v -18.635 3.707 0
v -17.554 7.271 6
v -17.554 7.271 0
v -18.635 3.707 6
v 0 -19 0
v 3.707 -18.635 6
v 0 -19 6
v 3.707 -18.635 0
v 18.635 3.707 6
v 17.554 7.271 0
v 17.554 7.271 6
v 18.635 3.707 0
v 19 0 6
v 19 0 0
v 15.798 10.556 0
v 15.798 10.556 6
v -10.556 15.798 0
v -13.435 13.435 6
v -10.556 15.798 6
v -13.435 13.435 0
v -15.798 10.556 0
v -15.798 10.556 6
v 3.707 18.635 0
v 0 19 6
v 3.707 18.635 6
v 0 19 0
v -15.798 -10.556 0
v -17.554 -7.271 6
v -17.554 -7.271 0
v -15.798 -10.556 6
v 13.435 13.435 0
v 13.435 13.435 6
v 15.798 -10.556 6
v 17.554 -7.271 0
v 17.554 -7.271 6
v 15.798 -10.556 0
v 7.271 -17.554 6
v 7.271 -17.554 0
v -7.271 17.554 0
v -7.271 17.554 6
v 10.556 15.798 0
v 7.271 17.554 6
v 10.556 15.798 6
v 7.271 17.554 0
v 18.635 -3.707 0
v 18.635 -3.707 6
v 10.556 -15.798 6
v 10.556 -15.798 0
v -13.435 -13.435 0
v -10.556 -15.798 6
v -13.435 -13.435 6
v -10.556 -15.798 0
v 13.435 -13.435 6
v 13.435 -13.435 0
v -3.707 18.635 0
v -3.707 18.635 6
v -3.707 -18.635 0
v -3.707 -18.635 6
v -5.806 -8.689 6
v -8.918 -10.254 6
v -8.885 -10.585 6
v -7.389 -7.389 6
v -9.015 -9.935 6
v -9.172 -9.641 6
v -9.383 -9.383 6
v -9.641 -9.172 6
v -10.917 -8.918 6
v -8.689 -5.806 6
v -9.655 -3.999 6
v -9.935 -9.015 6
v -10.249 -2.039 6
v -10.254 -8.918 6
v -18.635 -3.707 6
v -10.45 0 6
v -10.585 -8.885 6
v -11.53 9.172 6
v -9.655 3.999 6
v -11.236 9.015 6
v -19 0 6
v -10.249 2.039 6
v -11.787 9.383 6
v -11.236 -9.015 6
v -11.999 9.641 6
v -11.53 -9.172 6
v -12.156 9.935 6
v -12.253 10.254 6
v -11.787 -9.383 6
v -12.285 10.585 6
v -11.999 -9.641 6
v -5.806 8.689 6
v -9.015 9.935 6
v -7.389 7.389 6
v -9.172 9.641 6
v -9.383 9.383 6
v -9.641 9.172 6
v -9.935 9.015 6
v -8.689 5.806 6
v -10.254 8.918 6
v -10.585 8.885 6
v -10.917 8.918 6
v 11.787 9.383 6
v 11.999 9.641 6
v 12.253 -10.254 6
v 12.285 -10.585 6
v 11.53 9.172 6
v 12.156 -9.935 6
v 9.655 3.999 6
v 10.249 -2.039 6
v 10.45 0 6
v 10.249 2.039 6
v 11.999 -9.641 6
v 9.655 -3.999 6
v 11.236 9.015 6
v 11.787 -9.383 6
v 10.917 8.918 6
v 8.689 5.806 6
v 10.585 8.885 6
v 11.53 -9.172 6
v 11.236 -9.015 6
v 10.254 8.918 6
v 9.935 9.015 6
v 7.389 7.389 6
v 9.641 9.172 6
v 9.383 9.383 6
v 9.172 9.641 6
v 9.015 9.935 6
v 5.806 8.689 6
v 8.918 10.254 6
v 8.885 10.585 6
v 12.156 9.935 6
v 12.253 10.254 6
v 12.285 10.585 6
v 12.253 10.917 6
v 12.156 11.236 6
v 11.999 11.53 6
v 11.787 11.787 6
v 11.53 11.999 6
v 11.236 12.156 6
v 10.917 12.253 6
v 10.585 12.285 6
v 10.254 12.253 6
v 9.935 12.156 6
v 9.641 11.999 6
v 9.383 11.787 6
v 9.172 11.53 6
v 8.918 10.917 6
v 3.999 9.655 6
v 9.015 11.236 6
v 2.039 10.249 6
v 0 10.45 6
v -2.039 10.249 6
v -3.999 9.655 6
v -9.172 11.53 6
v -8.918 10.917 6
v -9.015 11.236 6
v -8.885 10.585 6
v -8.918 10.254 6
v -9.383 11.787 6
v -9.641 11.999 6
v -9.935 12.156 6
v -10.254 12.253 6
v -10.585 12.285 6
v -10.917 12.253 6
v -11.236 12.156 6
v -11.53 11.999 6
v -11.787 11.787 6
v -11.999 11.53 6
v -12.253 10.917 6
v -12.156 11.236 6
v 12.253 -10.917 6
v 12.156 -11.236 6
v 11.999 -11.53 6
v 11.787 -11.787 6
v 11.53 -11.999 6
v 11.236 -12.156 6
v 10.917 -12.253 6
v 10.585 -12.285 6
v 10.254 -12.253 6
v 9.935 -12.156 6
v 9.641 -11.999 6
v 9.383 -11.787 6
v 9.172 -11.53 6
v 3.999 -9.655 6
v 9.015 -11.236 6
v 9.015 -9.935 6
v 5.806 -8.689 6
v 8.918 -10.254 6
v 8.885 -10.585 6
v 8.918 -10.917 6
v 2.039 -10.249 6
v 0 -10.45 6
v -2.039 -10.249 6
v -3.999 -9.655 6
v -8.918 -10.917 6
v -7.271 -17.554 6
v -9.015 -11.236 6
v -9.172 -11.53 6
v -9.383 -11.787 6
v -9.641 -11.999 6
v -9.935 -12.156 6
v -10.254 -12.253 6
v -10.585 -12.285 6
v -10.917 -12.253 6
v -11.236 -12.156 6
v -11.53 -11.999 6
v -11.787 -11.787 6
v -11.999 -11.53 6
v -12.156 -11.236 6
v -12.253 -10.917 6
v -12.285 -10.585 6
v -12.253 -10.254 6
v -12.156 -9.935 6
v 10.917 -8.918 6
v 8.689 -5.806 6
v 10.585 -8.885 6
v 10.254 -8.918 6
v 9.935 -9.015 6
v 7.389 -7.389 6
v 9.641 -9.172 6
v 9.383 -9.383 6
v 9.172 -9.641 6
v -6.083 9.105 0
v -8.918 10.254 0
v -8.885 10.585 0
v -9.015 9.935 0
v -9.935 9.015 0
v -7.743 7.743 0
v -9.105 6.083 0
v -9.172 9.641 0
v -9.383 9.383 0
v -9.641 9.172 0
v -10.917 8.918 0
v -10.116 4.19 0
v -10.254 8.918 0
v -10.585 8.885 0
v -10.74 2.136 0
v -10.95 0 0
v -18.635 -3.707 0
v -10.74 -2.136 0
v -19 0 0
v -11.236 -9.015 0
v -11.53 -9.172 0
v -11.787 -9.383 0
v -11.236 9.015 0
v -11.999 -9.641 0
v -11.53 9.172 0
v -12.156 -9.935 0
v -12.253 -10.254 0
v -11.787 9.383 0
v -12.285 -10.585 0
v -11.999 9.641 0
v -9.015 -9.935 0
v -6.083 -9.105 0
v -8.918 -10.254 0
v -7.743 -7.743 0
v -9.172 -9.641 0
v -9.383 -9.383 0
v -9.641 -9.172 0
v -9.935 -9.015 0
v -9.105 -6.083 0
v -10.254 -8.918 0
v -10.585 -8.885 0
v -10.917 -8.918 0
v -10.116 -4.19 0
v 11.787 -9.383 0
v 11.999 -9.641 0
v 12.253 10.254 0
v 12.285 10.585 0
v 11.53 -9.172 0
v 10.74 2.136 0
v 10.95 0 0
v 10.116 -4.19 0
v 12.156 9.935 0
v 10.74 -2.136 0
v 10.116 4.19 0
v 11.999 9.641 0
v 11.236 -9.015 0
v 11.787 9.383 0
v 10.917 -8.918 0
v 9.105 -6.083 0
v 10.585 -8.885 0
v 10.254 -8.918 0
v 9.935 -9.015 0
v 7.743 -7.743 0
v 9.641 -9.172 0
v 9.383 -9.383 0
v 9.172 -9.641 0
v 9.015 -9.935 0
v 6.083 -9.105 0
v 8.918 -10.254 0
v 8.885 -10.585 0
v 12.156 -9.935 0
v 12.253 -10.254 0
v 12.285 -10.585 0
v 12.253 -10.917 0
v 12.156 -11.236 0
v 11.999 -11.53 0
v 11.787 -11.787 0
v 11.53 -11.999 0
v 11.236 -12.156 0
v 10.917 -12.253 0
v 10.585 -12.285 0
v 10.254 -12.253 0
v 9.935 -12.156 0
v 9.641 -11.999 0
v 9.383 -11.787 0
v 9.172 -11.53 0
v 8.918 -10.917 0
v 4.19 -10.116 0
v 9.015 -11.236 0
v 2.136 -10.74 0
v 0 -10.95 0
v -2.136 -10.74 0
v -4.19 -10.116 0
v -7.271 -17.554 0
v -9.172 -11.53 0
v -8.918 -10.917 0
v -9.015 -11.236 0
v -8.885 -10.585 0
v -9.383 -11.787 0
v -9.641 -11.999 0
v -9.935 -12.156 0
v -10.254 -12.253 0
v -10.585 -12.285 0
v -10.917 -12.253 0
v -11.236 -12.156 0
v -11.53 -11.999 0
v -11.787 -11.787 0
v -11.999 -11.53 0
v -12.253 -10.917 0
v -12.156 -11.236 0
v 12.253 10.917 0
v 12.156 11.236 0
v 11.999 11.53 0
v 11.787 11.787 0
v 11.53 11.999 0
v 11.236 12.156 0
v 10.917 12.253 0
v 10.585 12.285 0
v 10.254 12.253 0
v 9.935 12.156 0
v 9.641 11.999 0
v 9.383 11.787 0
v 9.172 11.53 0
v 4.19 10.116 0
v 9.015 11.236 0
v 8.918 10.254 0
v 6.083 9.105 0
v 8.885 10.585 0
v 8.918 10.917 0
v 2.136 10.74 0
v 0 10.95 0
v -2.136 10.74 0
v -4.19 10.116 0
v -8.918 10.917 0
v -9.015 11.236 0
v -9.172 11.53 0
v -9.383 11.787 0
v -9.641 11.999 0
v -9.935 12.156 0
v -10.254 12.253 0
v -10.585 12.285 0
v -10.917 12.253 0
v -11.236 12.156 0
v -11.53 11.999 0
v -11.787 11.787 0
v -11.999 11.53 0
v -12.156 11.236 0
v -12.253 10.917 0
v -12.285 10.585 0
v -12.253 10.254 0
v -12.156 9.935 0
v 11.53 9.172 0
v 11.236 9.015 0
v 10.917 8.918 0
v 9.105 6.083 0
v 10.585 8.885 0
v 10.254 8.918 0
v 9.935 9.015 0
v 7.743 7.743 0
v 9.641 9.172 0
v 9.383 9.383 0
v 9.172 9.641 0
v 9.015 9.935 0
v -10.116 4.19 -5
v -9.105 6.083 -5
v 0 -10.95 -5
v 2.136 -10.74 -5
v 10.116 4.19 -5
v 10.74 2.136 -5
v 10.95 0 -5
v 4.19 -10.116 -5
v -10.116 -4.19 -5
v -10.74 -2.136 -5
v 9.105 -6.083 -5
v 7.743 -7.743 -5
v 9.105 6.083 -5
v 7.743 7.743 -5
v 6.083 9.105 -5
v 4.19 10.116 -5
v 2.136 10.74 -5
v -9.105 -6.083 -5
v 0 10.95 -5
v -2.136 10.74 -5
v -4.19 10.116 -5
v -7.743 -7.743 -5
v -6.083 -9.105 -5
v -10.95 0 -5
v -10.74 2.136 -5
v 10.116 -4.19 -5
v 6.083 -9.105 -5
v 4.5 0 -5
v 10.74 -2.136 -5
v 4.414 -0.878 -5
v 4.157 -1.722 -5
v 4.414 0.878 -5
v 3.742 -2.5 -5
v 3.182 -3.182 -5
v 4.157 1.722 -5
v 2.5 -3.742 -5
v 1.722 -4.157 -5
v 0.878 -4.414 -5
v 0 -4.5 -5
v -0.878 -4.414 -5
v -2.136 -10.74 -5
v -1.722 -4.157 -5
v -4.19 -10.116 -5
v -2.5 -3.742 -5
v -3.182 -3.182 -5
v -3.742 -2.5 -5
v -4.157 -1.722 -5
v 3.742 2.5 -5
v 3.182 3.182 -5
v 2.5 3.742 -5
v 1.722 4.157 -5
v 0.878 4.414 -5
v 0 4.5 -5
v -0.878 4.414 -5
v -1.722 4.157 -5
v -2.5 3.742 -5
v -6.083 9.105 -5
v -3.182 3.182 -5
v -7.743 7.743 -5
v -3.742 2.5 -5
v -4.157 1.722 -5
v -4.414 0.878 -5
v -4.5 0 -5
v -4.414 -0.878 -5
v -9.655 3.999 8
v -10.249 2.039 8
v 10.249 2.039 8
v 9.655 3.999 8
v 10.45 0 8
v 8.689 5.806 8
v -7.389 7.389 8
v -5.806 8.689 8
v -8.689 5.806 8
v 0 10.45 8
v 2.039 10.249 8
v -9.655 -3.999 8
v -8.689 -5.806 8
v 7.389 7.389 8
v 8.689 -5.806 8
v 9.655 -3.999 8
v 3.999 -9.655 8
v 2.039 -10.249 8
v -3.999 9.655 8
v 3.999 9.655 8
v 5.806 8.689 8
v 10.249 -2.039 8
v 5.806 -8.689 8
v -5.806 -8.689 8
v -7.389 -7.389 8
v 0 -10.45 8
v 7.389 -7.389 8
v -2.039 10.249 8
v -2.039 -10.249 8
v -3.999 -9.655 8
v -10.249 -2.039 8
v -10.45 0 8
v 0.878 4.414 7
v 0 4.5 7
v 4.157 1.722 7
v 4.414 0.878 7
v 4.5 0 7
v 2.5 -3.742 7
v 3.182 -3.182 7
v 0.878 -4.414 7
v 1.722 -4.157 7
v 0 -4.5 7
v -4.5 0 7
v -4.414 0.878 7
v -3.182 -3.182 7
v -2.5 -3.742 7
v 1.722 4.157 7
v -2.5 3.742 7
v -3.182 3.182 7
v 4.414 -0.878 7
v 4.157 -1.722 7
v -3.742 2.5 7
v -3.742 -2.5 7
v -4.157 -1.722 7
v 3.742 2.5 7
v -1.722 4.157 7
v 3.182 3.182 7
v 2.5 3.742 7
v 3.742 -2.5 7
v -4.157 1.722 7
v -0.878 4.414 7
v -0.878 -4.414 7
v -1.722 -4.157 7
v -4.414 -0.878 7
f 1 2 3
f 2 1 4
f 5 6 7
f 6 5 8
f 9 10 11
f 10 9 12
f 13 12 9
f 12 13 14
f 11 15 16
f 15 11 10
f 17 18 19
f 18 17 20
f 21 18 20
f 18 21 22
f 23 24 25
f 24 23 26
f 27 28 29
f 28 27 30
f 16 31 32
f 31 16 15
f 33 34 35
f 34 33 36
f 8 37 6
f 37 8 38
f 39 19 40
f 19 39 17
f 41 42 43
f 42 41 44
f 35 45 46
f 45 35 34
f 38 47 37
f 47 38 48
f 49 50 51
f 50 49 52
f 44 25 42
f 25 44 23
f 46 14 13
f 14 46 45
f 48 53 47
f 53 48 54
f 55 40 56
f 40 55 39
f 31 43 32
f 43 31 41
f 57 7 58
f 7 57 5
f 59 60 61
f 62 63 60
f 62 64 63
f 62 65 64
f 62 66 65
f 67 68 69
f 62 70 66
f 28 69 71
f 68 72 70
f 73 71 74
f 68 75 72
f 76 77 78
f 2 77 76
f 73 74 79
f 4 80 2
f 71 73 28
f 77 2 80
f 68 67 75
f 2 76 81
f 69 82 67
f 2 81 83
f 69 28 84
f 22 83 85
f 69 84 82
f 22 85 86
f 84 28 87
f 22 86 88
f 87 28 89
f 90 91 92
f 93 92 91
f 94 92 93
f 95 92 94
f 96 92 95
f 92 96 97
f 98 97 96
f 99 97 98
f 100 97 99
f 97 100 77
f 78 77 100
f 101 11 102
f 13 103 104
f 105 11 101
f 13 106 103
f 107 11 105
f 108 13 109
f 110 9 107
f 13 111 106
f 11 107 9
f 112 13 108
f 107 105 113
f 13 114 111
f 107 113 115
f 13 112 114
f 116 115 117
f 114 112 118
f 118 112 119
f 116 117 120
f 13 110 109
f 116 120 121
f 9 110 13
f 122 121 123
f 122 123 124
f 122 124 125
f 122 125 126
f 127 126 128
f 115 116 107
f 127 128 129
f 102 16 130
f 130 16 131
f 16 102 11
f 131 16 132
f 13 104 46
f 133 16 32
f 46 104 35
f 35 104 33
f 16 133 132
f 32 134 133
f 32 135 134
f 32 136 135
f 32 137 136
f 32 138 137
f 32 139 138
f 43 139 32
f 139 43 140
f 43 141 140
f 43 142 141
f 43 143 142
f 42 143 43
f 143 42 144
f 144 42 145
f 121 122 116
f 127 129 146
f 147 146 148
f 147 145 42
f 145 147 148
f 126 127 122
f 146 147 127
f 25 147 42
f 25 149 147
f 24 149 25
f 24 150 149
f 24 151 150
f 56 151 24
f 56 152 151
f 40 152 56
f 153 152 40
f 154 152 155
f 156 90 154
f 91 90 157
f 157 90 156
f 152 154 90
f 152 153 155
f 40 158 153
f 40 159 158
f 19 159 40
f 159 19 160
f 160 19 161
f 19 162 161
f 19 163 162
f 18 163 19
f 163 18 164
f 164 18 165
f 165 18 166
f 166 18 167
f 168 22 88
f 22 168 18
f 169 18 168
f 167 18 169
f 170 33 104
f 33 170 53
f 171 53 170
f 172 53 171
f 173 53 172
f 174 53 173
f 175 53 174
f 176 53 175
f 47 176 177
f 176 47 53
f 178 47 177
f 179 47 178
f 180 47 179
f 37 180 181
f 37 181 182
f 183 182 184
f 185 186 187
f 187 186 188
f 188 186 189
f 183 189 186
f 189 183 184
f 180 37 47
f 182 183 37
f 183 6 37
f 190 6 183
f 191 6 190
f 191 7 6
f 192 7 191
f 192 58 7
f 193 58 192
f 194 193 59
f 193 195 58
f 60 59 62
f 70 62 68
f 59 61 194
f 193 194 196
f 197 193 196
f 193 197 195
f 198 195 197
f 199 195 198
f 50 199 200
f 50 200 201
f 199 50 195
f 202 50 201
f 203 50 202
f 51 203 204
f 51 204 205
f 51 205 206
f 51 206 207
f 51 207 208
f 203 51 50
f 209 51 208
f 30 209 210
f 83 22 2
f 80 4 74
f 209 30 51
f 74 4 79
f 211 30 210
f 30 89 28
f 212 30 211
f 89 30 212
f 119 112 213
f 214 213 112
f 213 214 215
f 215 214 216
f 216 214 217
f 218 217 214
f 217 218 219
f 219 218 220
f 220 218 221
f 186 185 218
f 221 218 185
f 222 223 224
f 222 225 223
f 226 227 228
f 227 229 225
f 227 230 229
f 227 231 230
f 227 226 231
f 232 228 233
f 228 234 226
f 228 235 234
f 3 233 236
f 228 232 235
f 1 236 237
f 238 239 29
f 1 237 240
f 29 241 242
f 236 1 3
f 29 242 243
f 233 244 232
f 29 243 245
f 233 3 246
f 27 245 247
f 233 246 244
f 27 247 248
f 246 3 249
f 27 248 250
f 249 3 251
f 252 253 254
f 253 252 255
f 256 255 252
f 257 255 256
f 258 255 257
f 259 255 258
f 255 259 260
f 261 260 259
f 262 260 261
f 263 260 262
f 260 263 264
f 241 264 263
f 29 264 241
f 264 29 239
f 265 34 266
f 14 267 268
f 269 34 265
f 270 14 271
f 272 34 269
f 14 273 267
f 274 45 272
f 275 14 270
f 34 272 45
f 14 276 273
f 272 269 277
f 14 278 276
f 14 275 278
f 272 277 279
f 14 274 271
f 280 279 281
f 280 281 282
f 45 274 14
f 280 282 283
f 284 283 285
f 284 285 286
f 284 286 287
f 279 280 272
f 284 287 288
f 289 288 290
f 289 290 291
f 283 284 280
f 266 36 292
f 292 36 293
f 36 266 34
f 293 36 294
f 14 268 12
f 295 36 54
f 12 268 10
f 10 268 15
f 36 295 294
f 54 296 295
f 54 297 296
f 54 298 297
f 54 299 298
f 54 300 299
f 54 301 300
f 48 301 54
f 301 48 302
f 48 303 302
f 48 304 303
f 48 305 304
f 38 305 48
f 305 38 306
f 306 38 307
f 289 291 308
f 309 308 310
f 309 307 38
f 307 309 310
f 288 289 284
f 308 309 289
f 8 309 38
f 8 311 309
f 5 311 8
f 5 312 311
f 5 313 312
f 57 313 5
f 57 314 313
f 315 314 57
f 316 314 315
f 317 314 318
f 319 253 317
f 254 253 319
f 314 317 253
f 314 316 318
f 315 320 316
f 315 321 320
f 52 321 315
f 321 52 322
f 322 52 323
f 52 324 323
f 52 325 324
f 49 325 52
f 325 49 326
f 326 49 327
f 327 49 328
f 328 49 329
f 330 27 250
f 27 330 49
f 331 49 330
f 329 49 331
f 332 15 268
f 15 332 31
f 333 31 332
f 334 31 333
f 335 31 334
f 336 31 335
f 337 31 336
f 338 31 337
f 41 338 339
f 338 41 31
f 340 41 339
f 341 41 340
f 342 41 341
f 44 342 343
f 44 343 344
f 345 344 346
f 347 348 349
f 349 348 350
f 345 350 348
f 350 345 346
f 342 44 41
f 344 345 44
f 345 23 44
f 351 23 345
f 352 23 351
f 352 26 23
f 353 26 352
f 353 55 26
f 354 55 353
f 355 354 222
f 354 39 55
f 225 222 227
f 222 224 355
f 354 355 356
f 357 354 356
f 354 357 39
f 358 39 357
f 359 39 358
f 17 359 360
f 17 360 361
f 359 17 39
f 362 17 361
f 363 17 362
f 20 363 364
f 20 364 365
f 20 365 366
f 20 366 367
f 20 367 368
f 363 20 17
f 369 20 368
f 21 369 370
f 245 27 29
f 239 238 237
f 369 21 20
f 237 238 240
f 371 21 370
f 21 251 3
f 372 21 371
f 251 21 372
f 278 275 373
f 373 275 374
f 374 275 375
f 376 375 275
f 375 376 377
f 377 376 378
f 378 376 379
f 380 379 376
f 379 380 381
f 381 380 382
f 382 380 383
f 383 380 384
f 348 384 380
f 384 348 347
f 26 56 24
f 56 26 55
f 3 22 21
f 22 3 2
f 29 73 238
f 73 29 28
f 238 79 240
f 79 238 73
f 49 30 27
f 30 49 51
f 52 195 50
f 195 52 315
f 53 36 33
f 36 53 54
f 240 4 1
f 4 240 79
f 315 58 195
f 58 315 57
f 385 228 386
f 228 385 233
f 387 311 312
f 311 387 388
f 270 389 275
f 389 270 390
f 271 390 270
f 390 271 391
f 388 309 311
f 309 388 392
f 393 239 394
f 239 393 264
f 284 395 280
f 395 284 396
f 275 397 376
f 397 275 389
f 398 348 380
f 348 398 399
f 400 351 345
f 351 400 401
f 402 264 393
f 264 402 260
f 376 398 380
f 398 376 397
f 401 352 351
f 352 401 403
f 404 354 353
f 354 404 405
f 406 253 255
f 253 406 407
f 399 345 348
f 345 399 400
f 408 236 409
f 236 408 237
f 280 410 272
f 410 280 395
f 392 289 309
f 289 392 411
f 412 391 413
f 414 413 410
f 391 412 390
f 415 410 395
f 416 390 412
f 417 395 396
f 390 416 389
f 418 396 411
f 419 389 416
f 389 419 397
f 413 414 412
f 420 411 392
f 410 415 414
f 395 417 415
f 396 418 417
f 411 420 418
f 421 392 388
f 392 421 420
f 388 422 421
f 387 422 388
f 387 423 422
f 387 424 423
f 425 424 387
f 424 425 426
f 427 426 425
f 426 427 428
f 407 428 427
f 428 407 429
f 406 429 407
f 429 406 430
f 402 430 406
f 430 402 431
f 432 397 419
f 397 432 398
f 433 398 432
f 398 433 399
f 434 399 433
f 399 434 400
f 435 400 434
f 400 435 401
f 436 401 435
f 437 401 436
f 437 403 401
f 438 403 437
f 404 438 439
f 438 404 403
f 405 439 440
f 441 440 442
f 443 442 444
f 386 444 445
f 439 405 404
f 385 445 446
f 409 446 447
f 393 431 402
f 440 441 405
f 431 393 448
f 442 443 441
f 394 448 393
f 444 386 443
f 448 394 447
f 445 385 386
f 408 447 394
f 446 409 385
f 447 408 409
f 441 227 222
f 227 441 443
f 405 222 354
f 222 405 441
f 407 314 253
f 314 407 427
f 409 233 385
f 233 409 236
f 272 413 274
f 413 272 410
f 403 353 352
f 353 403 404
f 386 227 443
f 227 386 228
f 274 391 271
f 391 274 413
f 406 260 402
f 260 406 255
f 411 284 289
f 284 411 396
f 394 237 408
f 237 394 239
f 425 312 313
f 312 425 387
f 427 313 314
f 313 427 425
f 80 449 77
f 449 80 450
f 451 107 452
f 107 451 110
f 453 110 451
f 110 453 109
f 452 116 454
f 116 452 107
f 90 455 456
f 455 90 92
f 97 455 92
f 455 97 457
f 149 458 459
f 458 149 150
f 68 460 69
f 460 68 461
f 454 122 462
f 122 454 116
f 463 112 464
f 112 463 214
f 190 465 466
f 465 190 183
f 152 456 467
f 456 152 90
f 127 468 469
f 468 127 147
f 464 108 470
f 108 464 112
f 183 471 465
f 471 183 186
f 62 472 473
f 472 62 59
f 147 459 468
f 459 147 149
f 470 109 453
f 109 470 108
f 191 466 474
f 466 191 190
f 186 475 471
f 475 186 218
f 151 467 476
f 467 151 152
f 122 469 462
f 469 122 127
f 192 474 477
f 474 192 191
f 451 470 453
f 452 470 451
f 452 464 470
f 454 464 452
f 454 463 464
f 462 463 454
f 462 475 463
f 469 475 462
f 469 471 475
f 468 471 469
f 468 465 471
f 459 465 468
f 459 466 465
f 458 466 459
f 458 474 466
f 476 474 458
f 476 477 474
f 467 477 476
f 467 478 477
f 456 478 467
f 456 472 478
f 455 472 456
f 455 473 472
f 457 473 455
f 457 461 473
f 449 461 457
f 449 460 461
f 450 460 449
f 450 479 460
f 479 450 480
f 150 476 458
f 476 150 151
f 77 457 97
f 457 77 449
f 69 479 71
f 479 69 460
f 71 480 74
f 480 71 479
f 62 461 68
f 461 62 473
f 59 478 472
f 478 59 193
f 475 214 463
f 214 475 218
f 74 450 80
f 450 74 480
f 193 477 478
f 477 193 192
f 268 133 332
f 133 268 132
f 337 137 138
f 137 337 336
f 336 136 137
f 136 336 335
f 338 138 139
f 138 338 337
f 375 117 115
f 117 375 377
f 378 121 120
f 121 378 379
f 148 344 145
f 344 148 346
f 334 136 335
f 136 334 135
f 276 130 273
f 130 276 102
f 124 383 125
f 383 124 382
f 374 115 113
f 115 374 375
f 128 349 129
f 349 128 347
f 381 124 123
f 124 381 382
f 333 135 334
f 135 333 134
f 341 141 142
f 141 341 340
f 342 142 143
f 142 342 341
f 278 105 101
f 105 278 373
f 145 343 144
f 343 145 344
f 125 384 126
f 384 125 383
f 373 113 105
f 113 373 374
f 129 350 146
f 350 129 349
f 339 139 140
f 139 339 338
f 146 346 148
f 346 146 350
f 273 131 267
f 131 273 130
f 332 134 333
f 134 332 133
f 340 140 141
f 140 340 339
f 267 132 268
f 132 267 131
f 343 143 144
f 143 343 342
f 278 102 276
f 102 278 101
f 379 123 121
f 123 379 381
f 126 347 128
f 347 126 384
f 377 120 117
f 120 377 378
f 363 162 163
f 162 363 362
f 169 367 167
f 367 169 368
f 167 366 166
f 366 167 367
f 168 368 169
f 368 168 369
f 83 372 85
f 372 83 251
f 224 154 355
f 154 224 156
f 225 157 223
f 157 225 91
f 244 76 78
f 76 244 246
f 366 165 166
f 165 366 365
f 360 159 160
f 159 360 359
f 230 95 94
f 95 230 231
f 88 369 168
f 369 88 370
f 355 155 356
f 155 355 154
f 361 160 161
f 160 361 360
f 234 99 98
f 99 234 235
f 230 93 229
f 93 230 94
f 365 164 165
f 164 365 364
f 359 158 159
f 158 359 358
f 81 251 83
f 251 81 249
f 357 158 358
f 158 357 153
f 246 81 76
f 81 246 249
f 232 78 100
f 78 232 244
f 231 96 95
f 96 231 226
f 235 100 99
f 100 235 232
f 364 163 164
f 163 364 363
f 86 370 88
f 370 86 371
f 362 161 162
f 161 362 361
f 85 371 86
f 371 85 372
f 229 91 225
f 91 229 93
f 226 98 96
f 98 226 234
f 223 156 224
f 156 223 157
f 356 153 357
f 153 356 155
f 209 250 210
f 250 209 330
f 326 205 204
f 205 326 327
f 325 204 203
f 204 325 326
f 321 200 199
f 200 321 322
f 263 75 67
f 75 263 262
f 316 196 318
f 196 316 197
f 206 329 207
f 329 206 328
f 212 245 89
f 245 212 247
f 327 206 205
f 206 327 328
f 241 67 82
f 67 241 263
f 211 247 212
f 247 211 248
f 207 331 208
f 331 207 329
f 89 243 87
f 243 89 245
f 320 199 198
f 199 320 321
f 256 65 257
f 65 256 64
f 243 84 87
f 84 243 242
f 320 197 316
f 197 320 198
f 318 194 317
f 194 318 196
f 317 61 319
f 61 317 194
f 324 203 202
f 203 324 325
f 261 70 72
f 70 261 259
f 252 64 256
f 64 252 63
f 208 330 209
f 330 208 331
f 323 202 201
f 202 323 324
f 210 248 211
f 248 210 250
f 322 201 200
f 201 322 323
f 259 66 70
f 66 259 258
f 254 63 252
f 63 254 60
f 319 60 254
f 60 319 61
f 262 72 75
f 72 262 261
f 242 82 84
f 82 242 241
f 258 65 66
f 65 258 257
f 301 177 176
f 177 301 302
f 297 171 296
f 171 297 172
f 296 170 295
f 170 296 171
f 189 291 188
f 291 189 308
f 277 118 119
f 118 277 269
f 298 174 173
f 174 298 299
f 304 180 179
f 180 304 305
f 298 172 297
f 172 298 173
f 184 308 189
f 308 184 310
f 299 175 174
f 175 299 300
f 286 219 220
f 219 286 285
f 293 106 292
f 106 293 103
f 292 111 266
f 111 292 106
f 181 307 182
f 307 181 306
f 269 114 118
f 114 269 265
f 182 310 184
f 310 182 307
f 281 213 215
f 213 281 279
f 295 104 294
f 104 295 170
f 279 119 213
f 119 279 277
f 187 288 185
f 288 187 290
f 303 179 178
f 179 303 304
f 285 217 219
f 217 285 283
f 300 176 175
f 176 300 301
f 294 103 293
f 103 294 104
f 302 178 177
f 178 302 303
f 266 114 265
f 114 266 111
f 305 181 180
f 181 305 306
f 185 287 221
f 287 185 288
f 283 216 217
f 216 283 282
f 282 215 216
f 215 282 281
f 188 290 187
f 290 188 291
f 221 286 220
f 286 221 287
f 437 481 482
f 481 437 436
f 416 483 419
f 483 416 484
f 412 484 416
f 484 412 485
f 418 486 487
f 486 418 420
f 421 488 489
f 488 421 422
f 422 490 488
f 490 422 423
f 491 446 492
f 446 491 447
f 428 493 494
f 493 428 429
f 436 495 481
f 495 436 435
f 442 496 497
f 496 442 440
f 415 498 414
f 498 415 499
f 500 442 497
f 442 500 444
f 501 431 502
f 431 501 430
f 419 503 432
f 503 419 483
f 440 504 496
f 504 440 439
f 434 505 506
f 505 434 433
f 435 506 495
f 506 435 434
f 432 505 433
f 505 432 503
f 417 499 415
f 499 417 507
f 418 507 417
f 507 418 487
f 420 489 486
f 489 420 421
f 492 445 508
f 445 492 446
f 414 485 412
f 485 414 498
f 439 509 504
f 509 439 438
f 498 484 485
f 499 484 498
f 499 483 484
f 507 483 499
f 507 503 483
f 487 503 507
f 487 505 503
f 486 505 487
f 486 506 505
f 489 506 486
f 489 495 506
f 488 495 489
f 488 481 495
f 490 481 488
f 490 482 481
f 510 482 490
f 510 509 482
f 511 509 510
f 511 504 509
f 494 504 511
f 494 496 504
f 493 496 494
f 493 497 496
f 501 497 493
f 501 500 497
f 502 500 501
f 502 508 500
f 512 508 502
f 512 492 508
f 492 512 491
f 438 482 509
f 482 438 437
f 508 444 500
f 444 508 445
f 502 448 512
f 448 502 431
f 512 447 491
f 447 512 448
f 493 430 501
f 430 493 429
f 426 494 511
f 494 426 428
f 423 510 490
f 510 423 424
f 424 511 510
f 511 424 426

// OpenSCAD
$fn = 32;

// ----------------------------------------------------------------------
// Retaining cap: 608 cover, 38 mm, spigot 21.9 mm
// ----------------------------------------------------------------------

// --- parameters (mm) ---
plate_d = 38;             // cover diameter
plate_t = 6;              // cover thickness
boss_d = 21.9;            // spigot that enters the housing
boss_h = 5;               // spigot height
shaft_d = 9;              // shaft opening
bolt_d = 3.4;             // bolt clearance
bolt_r = 14.97;           // bolt circle radius
dome_h = 2;               // raised centre

module cover() {
  cylinder(h = plate_t, d = plate_d);
}

module spigot() {
  /* sunk 1 mm into the cover; the spigot sets the overall height */
  translate([0, 0, -boss_h]) cylinder(h = boss_h + 1, d = boss_d);
}

module dome() {
  translate([0, 0, plate_t - 1]) cylinder(h = dome_h + 1, d = plate_d * 0.55);
}

difference() {
  union() {
    cover();
    spigot();
    dome();
  }
  for (i = [0 : 3]) rotate([0, 0, 45 + i * 90]) translate([bolt_r, 0, -boss_h - 1])
    cylinder(h = boss_h + plate_t + 2, d = bolt_d);
  translate([0, 0, -boss_h - 1]) cylinder(h = boss_h + plate_t + 2, d = shaft_d);
}
